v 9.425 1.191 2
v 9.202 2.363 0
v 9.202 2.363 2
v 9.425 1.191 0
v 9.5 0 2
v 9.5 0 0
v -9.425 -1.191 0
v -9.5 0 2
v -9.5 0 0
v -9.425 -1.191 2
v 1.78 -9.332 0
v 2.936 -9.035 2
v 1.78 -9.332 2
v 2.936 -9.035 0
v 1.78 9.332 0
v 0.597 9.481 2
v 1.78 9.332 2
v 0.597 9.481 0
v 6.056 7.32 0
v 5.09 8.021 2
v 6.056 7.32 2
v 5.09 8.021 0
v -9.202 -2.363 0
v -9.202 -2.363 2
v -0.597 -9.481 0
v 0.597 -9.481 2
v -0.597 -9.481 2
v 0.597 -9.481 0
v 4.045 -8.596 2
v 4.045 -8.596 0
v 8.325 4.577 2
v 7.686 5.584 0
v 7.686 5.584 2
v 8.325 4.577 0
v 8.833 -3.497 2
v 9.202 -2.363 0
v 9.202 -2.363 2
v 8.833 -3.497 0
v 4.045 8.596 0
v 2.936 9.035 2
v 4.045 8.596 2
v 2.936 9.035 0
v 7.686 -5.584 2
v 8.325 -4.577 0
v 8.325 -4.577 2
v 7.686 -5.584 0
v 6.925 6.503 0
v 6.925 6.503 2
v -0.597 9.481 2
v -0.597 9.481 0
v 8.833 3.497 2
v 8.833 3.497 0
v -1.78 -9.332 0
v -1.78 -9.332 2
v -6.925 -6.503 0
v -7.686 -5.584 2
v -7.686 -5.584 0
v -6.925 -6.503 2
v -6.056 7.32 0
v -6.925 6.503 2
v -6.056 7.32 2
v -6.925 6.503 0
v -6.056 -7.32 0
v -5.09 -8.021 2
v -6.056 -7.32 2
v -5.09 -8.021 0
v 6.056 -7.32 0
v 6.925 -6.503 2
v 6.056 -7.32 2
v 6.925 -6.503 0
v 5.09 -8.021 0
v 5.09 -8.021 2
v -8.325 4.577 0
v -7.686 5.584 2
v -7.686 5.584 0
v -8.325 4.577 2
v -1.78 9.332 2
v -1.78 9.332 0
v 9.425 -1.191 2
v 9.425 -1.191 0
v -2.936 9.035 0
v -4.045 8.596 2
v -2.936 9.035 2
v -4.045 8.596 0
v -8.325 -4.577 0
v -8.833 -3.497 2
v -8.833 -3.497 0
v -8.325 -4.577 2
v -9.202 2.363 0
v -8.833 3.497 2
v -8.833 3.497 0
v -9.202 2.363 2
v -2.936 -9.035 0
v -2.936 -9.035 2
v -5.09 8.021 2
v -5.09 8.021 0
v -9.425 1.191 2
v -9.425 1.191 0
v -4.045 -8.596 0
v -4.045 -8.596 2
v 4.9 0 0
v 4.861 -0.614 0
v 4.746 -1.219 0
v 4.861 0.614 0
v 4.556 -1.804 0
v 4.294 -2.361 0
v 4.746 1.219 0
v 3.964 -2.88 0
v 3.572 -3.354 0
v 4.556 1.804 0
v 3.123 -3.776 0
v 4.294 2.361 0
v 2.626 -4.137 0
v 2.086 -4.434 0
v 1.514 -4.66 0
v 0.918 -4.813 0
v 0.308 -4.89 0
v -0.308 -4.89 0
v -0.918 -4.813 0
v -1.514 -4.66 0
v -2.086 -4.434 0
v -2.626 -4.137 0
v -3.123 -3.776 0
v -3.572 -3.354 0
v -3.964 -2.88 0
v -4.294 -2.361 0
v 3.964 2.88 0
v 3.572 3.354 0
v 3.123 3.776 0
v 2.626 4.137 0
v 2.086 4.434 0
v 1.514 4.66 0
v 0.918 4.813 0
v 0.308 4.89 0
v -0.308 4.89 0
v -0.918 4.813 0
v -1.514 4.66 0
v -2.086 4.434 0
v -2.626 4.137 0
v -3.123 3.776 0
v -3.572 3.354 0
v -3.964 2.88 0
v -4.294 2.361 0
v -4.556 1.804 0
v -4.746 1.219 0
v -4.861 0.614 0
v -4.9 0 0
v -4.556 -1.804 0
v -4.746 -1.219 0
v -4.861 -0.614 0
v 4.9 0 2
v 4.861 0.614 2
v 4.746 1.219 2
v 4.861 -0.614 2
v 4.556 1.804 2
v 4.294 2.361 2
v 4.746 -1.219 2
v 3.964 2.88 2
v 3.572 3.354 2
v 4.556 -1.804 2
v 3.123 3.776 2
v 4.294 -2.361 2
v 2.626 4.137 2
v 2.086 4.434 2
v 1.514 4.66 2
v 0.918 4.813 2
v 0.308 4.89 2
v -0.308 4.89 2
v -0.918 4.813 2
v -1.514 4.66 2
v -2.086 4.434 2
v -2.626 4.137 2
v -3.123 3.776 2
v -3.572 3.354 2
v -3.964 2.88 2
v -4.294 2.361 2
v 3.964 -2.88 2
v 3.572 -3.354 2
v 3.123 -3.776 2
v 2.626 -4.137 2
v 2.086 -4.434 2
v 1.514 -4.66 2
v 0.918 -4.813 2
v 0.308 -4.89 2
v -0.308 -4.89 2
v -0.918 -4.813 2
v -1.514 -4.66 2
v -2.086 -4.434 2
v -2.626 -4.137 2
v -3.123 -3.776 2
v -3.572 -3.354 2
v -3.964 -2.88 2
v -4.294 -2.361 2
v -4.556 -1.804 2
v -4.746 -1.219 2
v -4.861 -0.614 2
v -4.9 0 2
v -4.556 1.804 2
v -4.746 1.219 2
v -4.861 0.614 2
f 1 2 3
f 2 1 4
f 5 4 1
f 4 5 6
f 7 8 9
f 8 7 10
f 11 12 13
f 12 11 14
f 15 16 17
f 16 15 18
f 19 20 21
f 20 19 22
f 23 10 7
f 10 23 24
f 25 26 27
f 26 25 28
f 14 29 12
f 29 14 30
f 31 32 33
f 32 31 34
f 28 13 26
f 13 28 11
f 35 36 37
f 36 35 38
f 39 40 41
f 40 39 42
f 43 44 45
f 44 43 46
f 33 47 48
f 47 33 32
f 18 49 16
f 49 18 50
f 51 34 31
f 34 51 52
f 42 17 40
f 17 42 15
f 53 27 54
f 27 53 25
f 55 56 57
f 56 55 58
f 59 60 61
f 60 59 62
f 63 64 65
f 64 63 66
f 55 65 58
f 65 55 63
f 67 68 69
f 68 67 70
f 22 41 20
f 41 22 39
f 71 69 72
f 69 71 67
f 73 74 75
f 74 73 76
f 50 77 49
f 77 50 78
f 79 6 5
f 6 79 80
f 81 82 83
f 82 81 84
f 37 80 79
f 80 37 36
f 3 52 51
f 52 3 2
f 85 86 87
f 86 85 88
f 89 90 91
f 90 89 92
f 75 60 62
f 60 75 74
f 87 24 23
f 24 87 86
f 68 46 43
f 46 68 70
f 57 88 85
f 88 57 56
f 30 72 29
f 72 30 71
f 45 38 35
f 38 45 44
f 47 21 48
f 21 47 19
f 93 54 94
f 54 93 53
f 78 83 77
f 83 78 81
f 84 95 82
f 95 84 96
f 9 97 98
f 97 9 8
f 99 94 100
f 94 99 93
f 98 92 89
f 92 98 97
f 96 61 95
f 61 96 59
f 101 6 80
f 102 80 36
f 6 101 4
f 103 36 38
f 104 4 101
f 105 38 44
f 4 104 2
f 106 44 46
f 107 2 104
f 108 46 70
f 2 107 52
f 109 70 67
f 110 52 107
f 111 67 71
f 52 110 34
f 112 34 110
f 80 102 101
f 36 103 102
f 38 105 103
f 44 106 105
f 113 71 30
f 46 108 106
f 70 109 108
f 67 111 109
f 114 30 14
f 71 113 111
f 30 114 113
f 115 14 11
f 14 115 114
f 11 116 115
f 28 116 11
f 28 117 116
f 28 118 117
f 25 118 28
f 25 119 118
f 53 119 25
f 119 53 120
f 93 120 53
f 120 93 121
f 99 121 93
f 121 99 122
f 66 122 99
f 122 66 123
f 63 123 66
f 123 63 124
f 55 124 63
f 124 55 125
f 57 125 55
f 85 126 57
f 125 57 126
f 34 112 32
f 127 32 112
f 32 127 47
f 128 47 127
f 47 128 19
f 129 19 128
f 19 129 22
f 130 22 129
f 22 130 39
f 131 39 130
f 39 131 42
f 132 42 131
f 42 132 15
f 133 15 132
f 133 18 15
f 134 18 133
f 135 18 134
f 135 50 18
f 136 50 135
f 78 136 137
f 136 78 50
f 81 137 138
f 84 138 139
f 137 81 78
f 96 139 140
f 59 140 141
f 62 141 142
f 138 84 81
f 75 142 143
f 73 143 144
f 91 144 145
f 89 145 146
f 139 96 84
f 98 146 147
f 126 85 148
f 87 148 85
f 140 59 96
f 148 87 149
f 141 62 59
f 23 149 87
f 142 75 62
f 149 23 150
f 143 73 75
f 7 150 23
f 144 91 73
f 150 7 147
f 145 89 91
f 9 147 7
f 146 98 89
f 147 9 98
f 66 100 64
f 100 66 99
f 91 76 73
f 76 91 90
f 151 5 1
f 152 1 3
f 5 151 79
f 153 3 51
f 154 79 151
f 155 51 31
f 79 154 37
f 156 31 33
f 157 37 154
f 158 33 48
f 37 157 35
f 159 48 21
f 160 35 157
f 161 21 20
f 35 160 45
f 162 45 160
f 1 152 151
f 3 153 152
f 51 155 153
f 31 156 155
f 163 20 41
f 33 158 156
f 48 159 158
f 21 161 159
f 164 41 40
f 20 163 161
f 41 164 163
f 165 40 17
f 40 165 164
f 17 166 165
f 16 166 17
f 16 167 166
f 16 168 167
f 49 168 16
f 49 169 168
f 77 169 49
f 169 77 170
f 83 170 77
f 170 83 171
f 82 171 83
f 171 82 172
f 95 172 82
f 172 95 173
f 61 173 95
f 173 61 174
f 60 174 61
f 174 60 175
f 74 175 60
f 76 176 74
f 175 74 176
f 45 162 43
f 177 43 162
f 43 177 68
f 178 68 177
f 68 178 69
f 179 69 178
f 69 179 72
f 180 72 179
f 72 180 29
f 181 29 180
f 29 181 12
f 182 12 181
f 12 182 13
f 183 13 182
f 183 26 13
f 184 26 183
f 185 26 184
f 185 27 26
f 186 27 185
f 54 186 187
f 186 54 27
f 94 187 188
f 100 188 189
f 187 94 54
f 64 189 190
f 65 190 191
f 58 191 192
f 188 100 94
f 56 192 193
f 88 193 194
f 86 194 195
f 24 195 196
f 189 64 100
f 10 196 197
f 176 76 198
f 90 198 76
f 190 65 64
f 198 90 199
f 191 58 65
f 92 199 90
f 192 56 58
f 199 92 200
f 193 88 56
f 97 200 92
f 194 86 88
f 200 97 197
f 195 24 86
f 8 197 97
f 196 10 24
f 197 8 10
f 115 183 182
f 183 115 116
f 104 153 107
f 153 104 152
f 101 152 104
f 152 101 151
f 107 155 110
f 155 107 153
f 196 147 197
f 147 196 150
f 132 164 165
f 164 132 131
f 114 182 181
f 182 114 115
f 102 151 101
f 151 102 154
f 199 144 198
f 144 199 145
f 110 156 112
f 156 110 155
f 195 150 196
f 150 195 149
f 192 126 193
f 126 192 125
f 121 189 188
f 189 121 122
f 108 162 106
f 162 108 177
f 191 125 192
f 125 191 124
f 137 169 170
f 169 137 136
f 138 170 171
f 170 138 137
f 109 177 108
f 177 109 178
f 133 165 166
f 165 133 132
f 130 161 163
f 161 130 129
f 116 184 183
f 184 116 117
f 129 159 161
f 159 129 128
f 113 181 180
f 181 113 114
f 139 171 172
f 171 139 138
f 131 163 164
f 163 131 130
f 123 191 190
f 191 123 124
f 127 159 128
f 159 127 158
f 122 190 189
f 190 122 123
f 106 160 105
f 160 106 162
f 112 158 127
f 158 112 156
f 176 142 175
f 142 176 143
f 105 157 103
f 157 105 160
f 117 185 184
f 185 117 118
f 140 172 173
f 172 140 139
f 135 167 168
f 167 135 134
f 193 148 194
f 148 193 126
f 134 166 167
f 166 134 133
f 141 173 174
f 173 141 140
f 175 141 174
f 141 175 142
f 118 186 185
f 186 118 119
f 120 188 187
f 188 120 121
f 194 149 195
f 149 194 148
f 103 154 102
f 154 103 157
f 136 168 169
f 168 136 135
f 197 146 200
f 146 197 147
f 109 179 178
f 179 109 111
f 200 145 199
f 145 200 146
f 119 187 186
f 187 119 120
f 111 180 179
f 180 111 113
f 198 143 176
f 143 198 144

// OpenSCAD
difference() {
    cylinder(2,19/2,19/2, $fn=50);
    cylinder(2,9.8/2,9.8/2, $fn=50);
}
